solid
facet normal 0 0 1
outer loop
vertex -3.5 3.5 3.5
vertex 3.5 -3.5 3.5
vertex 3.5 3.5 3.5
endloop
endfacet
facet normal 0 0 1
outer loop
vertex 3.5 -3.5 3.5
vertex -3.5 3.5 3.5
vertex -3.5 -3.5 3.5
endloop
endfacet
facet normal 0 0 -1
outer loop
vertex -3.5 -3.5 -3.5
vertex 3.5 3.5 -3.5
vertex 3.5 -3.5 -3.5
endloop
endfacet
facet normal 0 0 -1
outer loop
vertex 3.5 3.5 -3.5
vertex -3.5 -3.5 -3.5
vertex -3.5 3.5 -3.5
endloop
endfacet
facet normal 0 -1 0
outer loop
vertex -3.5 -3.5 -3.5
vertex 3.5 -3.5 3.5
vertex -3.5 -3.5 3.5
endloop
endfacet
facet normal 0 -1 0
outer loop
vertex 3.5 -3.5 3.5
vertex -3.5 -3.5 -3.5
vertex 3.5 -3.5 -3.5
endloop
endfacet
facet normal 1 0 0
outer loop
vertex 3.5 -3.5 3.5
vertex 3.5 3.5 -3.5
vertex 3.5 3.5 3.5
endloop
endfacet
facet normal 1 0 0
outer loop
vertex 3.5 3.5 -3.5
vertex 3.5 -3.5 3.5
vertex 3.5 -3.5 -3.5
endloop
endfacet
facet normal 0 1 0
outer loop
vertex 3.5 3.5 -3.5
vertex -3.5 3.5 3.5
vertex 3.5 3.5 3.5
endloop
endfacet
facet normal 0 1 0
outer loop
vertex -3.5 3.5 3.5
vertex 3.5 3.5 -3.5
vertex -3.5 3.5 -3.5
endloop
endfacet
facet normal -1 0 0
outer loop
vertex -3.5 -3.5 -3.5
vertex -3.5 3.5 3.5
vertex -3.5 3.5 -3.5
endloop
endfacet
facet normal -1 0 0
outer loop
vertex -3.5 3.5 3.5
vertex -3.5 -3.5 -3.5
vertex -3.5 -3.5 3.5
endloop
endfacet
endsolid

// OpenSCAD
// Generated by Mecha (https://github.com/tomahawkins/mecha)

color([0.5, 0.5, 0.5, 1.0]) translate ([-3.5, -3.5, -3.5]) cube(size = [7.0, 7.0, 7.0], center = false);
